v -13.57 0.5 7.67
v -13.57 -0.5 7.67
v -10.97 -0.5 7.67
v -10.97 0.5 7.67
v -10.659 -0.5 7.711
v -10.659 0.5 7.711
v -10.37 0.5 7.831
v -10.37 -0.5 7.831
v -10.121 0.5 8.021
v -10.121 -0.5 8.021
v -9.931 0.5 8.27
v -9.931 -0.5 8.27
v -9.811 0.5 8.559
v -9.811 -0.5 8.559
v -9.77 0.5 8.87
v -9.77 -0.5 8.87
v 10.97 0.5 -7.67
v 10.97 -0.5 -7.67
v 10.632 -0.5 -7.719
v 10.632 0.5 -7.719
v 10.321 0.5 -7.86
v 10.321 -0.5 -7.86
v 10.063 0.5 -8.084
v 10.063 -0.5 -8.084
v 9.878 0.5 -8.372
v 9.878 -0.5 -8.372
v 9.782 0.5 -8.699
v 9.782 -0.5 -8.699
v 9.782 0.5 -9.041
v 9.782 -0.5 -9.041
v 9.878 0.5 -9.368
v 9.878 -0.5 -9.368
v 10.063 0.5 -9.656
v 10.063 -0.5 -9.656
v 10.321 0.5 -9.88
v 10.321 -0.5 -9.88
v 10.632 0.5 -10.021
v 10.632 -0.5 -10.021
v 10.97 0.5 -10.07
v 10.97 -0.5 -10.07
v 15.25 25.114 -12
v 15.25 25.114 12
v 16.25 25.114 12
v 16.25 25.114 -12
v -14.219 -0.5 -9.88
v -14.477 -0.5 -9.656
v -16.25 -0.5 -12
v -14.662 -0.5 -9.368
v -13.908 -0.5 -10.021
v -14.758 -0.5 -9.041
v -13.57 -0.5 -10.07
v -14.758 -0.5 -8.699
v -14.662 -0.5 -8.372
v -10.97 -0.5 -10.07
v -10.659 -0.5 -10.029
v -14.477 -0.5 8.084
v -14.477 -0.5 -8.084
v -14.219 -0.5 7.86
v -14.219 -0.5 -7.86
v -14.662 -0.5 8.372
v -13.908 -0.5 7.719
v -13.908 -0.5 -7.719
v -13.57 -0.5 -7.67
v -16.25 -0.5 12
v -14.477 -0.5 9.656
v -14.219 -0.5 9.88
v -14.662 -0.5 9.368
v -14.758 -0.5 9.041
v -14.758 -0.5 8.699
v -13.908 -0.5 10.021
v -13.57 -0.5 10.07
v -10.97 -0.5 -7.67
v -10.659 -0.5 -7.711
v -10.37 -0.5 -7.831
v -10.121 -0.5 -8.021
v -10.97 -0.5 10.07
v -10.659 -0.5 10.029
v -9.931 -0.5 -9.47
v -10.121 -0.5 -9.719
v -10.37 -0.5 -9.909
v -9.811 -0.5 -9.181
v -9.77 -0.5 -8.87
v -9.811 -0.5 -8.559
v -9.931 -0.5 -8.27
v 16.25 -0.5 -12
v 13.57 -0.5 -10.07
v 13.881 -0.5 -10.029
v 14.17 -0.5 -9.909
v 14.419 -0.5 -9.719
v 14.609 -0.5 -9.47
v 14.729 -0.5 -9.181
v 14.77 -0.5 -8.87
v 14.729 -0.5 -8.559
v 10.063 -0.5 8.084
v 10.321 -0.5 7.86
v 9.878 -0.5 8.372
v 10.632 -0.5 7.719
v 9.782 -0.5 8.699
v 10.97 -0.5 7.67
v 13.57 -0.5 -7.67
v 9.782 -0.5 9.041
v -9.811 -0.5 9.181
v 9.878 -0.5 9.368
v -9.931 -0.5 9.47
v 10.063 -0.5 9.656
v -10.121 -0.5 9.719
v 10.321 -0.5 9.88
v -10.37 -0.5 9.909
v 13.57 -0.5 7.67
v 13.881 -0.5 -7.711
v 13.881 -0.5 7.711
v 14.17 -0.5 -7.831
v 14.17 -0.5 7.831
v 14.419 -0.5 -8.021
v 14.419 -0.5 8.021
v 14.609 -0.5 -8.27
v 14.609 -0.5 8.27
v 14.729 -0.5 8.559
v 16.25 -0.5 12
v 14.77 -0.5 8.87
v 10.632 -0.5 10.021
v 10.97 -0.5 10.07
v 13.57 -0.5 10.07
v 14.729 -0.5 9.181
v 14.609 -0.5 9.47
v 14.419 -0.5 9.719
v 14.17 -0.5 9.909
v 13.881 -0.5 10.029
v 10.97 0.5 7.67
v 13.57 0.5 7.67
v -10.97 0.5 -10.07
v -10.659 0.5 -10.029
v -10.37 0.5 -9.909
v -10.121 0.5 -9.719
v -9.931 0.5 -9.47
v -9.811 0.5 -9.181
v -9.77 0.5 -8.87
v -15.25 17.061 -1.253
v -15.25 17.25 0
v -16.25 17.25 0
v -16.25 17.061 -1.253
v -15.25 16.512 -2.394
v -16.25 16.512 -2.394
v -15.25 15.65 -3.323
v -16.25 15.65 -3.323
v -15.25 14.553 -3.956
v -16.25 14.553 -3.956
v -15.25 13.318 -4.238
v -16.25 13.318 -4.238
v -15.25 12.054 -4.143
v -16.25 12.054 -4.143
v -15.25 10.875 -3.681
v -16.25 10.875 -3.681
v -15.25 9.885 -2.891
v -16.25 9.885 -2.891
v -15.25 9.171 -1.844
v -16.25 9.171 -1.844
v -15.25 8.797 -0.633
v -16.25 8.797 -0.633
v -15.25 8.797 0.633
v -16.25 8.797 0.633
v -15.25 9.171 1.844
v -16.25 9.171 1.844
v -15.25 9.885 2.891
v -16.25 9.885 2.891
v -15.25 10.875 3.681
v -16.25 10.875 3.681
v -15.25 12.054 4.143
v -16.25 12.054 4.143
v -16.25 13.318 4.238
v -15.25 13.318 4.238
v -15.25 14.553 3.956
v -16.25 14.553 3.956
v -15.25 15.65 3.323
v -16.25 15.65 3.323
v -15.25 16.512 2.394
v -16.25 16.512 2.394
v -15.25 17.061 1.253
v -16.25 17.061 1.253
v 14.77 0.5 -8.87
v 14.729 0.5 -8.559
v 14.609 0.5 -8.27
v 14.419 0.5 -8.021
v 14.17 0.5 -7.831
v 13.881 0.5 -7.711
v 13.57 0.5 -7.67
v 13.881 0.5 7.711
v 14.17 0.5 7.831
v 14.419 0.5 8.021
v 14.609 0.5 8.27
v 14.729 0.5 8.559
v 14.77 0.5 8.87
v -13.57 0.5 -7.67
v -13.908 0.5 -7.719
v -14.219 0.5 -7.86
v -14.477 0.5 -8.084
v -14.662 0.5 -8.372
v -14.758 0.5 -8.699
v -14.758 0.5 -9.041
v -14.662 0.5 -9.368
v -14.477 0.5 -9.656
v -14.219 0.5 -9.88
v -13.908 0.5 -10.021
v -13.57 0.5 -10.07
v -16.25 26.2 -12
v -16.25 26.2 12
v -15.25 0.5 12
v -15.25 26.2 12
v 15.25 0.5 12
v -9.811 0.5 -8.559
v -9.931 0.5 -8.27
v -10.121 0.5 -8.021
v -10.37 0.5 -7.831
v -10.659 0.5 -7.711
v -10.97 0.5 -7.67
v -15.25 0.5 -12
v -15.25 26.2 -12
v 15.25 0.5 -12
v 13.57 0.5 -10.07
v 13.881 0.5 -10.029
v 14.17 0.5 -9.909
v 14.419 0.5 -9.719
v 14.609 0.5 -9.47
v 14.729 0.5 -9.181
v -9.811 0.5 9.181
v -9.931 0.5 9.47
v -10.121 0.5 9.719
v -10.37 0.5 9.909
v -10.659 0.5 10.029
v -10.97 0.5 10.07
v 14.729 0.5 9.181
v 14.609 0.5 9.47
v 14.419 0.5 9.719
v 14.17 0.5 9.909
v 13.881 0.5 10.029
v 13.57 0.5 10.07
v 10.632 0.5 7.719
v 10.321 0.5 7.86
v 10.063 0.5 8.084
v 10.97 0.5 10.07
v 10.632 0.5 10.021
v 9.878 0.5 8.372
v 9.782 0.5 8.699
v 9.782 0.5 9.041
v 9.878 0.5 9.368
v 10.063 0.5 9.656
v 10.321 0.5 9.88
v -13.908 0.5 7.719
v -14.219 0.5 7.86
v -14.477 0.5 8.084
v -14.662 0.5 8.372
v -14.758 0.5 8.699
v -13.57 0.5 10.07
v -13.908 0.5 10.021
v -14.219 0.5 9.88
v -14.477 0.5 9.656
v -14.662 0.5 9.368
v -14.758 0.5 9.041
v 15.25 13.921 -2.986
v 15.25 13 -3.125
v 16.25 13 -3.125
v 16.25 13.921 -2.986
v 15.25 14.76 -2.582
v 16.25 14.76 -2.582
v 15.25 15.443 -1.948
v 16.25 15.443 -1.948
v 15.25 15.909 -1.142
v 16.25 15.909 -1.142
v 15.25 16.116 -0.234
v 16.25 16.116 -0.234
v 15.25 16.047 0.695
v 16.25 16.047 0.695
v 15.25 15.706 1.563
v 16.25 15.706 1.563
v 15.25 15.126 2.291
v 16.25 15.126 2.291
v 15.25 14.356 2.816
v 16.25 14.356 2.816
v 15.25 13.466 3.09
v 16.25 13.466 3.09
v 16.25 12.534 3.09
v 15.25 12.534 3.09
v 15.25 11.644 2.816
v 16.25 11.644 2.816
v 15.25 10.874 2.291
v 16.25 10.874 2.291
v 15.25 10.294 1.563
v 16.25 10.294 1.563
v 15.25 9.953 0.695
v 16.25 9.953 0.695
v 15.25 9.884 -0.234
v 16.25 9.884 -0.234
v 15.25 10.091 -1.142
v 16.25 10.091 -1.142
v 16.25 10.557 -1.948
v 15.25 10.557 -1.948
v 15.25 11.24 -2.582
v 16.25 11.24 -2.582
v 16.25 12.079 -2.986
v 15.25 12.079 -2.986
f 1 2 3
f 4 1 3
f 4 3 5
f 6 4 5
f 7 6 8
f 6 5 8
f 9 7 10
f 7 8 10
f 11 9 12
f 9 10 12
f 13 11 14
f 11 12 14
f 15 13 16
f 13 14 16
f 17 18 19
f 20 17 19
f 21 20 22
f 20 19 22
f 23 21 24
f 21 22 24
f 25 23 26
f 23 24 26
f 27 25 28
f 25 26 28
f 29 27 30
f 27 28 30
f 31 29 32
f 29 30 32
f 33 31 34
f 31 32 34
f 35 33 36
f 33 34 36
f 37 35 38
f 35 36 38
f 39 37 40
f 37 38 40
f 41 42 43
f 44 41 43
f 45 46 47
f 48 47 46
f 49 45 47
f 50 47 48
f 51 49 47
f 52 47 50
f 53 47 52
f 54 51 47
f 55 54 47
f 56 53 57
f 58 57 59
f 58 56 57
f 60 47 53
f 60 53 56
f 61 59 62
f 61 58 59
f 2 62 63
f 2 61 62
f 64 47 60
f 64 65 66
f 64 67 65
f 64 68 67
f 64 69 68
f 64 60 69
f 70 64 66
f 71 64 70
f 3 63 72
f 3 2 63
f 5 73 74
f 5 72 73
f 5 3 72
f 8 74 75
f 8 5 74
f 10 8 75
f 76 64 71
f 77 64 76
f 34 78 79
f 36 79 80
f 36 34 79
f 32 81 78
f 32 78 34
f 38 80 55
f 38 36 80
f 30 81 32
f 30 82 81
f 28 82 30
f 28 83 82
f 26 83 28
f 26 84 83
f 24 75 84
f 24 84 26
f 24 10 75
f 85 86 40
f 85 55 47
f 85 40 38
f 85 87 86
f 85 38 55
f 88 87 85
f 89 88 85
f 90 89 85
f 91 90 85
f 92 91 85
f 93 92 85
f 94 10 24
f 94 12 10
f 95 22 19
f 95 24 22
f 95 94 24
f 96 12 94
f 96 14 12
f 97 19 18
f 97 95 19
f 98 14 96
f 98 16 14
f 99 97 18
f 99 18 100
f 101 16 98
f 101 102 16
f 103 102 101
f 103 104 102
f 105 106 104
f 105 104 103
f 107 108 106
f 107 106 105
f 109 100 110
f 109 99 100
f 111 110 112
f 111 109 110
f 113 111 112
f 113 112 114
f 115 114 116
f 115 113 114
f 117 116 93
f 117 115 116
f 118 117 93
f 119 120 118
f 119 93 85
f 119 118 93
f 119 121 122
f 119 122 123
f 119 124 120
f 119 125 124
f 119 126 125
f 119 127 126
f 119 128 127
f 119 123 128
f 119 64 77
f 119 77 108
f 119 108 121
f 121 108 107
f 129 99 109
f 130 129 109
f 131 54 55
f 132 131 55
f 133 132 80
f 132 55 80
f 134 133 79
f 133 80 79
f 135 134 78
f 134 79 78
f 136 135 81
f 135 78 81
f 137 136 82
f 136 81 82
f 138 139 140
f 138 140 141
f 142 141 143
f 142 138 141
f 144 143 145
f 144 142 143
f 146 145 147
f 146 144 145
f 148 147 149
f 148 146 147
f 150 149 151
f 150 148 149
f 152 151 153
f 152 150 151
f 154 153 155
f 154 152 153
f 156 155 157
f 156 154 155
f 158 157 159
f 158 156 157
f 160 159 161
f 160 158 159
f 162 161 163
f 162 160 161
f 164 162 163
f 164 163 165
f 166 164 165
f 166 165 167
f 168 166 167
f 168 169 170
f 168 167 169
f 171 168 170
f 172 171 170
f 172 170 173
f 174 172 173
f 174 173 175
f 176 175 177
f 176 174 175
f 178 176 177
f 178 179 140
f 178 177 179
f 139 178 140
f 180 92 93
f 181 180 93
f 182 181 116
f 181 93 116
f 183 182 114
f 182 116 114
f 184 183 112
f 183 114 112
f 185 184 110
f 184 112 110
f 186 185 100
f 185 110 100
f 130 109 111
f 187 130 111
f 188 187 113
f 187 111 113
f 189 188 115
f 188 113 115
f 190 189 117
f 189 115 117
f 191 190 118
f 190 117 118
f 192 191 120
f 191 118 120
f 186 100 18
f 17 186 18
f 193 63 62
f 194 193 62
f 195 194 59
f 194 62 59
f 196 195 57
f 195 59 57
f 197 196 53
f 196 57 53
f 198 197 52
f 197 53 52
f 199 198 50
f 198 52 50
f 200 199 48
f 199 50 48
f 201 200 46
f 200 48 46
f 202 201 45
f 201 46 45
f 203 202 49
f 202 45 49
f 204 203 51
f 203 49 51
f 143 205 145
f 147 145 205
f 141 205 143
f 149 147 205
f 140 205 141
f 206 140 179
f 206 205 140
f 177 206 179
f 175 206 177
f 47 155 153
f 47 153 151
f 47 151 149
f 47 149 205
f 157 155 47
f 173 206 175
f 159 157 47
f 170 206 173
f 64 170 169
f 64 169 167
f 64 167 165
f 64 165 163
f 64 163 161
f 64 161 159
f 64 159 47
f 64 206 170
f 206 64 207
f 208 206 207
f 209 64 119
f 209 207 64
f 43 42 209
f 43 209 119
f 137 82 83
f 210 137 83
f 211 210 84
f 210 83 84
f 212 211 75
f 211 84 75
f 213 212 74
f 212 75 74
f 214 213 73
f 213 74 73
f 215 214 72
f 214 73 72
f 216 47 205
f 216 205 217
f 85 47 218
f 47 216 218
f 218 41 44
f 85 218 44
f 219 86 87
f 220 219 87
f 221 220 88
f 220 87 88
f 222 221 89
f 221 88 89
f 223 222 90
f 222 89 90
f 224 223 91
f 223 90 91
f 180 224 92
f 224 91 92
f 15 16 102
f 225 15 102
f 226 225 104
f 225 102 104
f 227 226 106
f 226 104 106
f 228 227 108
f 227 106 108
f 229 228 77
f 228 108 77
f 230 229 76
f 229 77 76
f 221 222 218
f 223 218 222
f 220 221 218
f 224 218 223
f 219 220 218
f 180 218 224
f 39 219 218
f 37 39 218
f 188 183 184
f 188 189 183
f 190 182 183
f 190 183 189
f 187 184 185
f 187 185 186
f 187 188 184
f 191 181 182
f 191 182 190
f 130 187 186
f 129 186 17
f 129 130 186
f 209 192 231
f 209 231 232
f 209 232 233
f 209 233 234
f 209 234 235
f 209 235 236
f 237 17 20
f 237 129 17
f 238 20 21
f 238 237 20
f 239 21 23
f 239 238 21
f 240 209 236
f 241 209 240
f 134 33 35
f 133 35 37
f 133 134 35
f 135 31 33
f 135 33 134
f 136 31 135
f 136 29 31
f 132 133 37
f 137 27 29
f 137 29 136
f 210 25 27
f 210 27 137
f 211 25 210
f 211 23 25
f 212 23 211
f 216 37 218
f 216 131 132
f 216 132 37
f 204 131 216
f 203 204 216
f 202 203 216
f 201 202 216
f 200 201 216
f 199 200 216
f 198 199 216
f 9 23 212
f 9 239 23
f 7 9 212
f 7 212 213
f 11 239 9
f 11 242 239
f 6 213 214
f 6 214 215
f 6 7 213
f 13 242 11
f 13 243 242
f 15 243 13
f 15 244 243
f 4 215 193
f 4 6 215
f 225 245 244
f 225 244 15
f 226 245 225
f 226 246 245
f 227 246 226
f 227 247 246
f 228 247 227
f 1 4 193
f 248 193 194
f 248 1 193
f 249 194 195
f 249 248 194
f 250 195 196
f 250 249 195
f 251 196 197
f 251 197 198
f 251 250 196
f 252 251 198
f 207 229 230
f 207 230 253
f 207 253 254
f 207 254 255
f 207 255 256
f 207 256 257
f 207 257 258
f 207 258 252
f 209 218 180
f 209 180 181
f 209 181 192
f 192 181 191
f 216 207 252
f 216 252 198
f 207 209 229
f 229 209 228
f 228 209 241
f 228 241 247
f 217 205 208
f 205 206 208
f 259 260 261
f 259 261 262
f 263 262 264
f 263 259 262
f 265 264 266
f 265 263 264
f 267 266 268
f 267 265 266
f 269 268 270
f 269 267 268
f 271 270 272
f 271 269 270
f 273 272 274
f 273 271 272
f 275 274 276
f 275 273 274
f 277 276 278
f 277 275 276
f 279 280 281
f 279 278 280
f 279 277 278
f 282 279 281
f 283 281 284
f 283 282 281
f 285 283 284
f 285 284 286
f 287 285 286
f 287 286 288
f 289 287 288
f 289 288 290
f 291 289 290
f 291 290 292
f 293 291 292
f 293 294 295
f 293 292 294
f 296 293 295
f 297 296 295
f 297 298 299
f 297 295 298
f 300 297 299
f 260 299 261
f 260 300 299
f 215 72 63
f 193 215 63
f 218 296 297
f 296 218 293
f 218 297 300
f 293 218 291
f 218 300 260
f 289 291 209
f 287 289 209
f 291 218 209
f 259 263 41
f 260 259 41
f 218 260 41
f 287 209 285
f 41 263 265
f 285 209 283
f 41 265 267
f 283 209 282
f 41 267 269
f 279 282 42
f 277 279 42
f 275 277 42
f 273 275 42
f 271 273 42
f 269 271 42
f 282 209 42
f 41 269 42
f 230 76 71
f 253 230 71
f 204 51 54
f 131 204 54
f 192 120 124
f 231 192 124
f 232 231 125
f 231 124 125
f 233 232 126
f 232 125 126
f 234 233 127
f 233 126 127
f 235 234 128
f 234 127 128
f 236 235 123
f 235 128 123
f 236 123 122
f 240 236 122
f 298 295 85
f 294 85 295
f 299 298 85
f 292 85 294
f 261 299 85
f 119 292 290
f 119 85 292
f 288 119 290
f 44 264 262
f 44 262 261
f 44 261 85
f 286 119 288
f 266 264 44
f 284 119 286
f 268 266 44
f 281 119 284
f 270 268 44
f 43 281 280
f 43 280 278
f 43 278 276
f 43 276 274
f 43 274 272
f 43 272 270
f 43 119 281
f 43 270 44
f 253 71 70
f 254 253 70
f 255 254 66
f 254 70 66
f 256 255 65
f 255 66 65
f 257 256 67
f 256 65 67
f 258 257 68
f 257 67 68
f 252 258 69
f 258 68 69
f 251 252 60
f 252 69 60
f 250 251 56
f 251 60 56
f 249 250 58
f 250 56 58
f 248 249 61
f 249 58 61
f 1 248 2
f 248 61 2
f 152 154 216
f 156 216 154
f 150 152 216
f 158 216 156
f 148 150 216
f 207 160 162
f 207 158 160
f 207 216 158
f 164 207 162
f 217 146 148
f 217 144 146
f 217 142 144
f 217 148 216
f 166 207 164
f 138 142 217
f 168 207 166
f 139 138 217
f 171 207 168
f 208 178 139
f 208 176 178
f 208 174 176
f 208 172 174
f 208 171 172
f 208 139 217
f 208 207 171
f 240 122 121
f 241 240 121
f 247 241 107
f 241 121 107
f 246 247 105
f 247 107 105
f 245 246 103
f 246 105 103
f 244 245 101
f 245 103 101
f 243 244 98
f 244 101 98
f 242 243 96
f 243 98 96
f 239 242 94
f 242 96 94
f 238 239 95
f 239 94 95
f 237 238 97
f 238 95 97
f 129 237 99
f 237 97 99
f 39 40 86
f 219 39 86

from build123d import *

# Parameters (mm, degrees)
SKETCH1_W               = 1
SKETCH1_H               = 25.7
SKETCH1_H_2             = 1
SKETCH1_W_2             = 30.5
SKETCH1_H_3             = 24.613793103
BOSS_EXTRUDE1_DEPTH     = 12
CUT_EXTRUDE1_DEPTH      = 44.43604494
CUT_EXTRUDE1_DEPTH_BACK = 44.43604494
SKETCH2_R               = 3.125
CUT_EXTRUDE2_DEPTH      = 44.43604494
CUT_EXTRUDE2_DEPTH_BACK = 24
SKETCH3_R               = 4.25
CUT_EXTRUDE3_DEPTH      = 24


with BuildPart() as part:
    # Sketch1 → Boss-Extrude1 (new, symmetric)
    with BuildSketch(Plane.XY):
        with Locations((-15.75, 13.35)):
            Rectangle(SKETCH1_W, SKETCH1_H)
        with Locations((-15.75, 0)):
            Rectangle(SKETCH1_W, SKETCH1_H_2)
        Rectangle(SKETCH1_W_2, SKETCH1_H_2)
        with Locations((15.75, 0)):
            Rectangle(SKETCH1_W, SKETCH1_H_2)
        with Locations((15.75, 12.806896552)):
            Rectangle(SKETCH1_W, SKETCH1_H_3)
    extrude(amount=BOSS_EXTRUDE1_DEPTH, both=True)

    # Sketch2 → Cut-Extrude1 (cut, two sides: drawn at the far end of the back side and taken through both)
    with BuildSketch(Plane(origin=(16.25, 0, 0), x_dir=(0, 0, -1), z_dir=(1, 0, 0)).offset(-CUT_EXTRUDE1_DEPTH_BACK)):
        with Locations((0, 13)):
            Circle(SKETCH2_R)
    extrude(amount=CUT_EXTRUDE1_DEPTH + CUT_EXTRUDE1_DEPTH_BACK, mode=Mode.SUBTRACT)

    # Sketch3 → Cut-Extrude2 (cut, two sides: drawn at the far end of the back side and taken through both)
    with BuildSketch(Plane.ZY.offset(16.25).offset(-CUT_EXTRUDE2_DEPTH_BACK)):
        with Locations(Location((0, 13, 0), (0, 0, 90))):
            Circle(SKETCH3_R)
    extrude(amount=CUT_EXTRUDE2_DEPTH + CUT_EXTRUDE2_DEPTH_BACK, mode=Mode.SUBTRACT)

    # Sketch4 → Cut-Extrude3 (cut)
    with BuildSketch(Plane.XZ.offset(0.5)):
        with BuildLine():
            ThreePointArc((-13.57, -7.67), (-14.77, -8.87), (-13.57, -10.07))
            Line((-13.57, -10.07), (-13.57, -7.67))
        make_face()
        with BuildLine():
            Line((-13.57, -7.67), (-13.57, -10.07))
            ThreePointArc((-13.57, -10.07), (-12.721471863, -9.718528137), (-12.37, -8.87))
            ThreePointArc((-12.37, -8.87), (-12.721471863, -8.021471863), (-13.57, -7.67))
        make_face()
        with BuildLine():
            Line((-13.57, -10.07), (-10.97, -10.07))
            ThreePointArc((-10.97, -10.07), (-12.17, -8.87), (-10.97, -7.67))
            Line((-10.97, -7.67), (-13.57, -7.67))
            ThreePointArc((-13.57, -7.67), (-12.721471863, -8.021471863), (-12.37, -8.87))
            ThreePointArc((-12.37, -8.87), (-12.721471863, -9.718528137), (-13.57, -10.07))
        make_face()
        with BuildLine():
            ThreePointArc((-10.97, -7.67), (-12.17, -8.87), (-10.97, -10.07))
            Line((-10.97, -10.07), (-10.97, -7.67))
        make_face()
        with BuildLine():
            Line((-10.97, -7.67), (-10.97, -10.07))
            ThreePointArc((-10.97, -10.07), (-10.121471863, -9.718528137), (-9.77, -8.87))
            ThreePointArc((-9.77, -8.87), (-10.121471863, -8.021471863), (-10.97, -7.67))
        make_face()
        with BuildLine():
            ThreePointArc((10.97, -7.67), (9.77, -8.87), (10.97, -10.07))
            Line((10.97, -10.07), (10.97, -7.67))
        make_face()
        with BuildLine():
            Line((10.97, -7.67), (10.97, -10.07))
            ThreePointArc((10.97, -10.07), (11.818528137, -9.718528137), (12.17, -8.87))
            ThreePointArc((12.17, -8.87), (11.818528137, -8.021471863), (10.97, -7.67))
        make_face()
        with BuildLine():
            Line((10.97, -10.07), (13.57, -10.07))
            ThreePointArc((13.57, -10.07), (12.37, -8.87), (13.57, -7.67))
            Line((13.57, -7.67), (10.97, -7.67))
            ThreePointArc((10.97, -7.67), (11.818528137, -8.021471863), (12.17, -8.87))
            ThreePointArc((12.17, -8.87), (11.818528137, -9.718528137), (10.97, -10.07))
        make_face()
        with BuildLine():
            ThreePointArc((13.57, -7.67), (12.37, -8.87), (13.57, -10.07))
            Line((13.57, -10.07), (13.57, -7.67))
        make_face()
        with BuildLine():
            Line((13.57, -7.67), (13.57, -10.07))
            ThreePointArc((13.57, -10.07), (14.418528137, -9.718528137), (14.77, -8.87))
            ThreePointArc((14.77, -8.87), (14.418528137, -8.021471863), (13.57, -7.67))
        make_face()
        with BuildLine():
            ThreePointArc((12.17, 8.87), (11.818528137, 9.718528137), (10.97, 10.07))
            Line((10.97, 10.07), (10.97, 7.67))
            ThreePointArc((10.97, 7.67), (11.818528137, 8.021471863), (12.17, 8.87))
        make_face()
        with BuildLine():
            Line((10.97, 7.67), (10.97, 10.07))
            ThreePointArc((10.97, 10.07), (9.77, 8.87), (10.97, 7.67))
        make_face()
        with BuildLine():
            Line((13.57, 10.07), (10.97, 10.07))
            ThreePointArc((10.97, 10.07), (11.818528137, 9.718528137), (12.17, 8.87))
            ThreePointArc((12.17, 8.87), (11.818528137, 8.021471863), (10.97, 7.67))
            Line((10.97, 7.67), (13.57, 7.67))
            ThreePointArc((13.57, 7.67), (12.37, 8.87), (13.57, 10.07))
        make_face()
        with BuildLine():
            ThreePointArc((14.77, 8.87), (14.418528137, 9.718528137), (13.57, 10.07))
            Line((13.57, 10.07), (13.57, 7.67))
            ThreePointArc((13.57, 7.67), (14.418528137, 8.021471863), (14.77, 8.87))
        make_face()
        with BuildLine():
            Line((13.57, 7.67), (13.57, 10.07))
            ThreePointArc((13.57, 10.07), (12.37, 8.87), (13.57, 7.67))
        make_face()
        with BuildLine():
            ThreePointArc((-12.37, 8.87), (-12.721471863, 9.718528137), (-13.57, 10.07))
            Line((-13.57, 10.07), (-13.57, 7.67))
            ThreePointArc((-13.57, 7.67), (-12.721471863, 8.021471863), (-12.37, 8.87))
        make_face()
        with BuildLine():
            Line((-13.57, 7.67), (-13.57, 10.07))
            ThreePointArc((-13.57, 10.07), (-14.77, 8.87), (-13.57, 7.67))
        make_face()
        with BuildLine():
            Line((-10.97, 10.07), (-13.57, 10.07))
            ThreePointArc((-13.57, 10.07), (-12.721471863, 9.718528137), (-12.37, 8.87))
            ThreePointArc((-12.37, 8.87), (-12.721471863, 8.021471863), (-13.57, 7.67))
            Line((-13.57, 7.67), (-10.97, 7.67))
            ThreePointArc((-10.97, 7.67), (-12.17, 8.87), (-10.97, 10.07))
        make_face()
        with BuildLine():
            ThreePointArc((-9.77, 8.87), (-10.121471863, 9.718528137), (-10.97, 10.07))
            Line((-10.97, 10.07), (-10.97, 7.67))
            ThreePointArc((-10.97, 7.67), (-10.121471863, 8.021471863), (-9.77, 8.87))
        make_face()
        with BuildLine():
            Line((-10.97, 7.67), (-10.97, 10.07))
            ThreePointArc((-10.97, 10.07), (-12.17, 8.87), (-10.97, 7.67))
        make_face()
    extrude(amount=-CUT_EXTRUDE3_DEPTH, mode=Mode.SUBTRACT)


solid = part.part
